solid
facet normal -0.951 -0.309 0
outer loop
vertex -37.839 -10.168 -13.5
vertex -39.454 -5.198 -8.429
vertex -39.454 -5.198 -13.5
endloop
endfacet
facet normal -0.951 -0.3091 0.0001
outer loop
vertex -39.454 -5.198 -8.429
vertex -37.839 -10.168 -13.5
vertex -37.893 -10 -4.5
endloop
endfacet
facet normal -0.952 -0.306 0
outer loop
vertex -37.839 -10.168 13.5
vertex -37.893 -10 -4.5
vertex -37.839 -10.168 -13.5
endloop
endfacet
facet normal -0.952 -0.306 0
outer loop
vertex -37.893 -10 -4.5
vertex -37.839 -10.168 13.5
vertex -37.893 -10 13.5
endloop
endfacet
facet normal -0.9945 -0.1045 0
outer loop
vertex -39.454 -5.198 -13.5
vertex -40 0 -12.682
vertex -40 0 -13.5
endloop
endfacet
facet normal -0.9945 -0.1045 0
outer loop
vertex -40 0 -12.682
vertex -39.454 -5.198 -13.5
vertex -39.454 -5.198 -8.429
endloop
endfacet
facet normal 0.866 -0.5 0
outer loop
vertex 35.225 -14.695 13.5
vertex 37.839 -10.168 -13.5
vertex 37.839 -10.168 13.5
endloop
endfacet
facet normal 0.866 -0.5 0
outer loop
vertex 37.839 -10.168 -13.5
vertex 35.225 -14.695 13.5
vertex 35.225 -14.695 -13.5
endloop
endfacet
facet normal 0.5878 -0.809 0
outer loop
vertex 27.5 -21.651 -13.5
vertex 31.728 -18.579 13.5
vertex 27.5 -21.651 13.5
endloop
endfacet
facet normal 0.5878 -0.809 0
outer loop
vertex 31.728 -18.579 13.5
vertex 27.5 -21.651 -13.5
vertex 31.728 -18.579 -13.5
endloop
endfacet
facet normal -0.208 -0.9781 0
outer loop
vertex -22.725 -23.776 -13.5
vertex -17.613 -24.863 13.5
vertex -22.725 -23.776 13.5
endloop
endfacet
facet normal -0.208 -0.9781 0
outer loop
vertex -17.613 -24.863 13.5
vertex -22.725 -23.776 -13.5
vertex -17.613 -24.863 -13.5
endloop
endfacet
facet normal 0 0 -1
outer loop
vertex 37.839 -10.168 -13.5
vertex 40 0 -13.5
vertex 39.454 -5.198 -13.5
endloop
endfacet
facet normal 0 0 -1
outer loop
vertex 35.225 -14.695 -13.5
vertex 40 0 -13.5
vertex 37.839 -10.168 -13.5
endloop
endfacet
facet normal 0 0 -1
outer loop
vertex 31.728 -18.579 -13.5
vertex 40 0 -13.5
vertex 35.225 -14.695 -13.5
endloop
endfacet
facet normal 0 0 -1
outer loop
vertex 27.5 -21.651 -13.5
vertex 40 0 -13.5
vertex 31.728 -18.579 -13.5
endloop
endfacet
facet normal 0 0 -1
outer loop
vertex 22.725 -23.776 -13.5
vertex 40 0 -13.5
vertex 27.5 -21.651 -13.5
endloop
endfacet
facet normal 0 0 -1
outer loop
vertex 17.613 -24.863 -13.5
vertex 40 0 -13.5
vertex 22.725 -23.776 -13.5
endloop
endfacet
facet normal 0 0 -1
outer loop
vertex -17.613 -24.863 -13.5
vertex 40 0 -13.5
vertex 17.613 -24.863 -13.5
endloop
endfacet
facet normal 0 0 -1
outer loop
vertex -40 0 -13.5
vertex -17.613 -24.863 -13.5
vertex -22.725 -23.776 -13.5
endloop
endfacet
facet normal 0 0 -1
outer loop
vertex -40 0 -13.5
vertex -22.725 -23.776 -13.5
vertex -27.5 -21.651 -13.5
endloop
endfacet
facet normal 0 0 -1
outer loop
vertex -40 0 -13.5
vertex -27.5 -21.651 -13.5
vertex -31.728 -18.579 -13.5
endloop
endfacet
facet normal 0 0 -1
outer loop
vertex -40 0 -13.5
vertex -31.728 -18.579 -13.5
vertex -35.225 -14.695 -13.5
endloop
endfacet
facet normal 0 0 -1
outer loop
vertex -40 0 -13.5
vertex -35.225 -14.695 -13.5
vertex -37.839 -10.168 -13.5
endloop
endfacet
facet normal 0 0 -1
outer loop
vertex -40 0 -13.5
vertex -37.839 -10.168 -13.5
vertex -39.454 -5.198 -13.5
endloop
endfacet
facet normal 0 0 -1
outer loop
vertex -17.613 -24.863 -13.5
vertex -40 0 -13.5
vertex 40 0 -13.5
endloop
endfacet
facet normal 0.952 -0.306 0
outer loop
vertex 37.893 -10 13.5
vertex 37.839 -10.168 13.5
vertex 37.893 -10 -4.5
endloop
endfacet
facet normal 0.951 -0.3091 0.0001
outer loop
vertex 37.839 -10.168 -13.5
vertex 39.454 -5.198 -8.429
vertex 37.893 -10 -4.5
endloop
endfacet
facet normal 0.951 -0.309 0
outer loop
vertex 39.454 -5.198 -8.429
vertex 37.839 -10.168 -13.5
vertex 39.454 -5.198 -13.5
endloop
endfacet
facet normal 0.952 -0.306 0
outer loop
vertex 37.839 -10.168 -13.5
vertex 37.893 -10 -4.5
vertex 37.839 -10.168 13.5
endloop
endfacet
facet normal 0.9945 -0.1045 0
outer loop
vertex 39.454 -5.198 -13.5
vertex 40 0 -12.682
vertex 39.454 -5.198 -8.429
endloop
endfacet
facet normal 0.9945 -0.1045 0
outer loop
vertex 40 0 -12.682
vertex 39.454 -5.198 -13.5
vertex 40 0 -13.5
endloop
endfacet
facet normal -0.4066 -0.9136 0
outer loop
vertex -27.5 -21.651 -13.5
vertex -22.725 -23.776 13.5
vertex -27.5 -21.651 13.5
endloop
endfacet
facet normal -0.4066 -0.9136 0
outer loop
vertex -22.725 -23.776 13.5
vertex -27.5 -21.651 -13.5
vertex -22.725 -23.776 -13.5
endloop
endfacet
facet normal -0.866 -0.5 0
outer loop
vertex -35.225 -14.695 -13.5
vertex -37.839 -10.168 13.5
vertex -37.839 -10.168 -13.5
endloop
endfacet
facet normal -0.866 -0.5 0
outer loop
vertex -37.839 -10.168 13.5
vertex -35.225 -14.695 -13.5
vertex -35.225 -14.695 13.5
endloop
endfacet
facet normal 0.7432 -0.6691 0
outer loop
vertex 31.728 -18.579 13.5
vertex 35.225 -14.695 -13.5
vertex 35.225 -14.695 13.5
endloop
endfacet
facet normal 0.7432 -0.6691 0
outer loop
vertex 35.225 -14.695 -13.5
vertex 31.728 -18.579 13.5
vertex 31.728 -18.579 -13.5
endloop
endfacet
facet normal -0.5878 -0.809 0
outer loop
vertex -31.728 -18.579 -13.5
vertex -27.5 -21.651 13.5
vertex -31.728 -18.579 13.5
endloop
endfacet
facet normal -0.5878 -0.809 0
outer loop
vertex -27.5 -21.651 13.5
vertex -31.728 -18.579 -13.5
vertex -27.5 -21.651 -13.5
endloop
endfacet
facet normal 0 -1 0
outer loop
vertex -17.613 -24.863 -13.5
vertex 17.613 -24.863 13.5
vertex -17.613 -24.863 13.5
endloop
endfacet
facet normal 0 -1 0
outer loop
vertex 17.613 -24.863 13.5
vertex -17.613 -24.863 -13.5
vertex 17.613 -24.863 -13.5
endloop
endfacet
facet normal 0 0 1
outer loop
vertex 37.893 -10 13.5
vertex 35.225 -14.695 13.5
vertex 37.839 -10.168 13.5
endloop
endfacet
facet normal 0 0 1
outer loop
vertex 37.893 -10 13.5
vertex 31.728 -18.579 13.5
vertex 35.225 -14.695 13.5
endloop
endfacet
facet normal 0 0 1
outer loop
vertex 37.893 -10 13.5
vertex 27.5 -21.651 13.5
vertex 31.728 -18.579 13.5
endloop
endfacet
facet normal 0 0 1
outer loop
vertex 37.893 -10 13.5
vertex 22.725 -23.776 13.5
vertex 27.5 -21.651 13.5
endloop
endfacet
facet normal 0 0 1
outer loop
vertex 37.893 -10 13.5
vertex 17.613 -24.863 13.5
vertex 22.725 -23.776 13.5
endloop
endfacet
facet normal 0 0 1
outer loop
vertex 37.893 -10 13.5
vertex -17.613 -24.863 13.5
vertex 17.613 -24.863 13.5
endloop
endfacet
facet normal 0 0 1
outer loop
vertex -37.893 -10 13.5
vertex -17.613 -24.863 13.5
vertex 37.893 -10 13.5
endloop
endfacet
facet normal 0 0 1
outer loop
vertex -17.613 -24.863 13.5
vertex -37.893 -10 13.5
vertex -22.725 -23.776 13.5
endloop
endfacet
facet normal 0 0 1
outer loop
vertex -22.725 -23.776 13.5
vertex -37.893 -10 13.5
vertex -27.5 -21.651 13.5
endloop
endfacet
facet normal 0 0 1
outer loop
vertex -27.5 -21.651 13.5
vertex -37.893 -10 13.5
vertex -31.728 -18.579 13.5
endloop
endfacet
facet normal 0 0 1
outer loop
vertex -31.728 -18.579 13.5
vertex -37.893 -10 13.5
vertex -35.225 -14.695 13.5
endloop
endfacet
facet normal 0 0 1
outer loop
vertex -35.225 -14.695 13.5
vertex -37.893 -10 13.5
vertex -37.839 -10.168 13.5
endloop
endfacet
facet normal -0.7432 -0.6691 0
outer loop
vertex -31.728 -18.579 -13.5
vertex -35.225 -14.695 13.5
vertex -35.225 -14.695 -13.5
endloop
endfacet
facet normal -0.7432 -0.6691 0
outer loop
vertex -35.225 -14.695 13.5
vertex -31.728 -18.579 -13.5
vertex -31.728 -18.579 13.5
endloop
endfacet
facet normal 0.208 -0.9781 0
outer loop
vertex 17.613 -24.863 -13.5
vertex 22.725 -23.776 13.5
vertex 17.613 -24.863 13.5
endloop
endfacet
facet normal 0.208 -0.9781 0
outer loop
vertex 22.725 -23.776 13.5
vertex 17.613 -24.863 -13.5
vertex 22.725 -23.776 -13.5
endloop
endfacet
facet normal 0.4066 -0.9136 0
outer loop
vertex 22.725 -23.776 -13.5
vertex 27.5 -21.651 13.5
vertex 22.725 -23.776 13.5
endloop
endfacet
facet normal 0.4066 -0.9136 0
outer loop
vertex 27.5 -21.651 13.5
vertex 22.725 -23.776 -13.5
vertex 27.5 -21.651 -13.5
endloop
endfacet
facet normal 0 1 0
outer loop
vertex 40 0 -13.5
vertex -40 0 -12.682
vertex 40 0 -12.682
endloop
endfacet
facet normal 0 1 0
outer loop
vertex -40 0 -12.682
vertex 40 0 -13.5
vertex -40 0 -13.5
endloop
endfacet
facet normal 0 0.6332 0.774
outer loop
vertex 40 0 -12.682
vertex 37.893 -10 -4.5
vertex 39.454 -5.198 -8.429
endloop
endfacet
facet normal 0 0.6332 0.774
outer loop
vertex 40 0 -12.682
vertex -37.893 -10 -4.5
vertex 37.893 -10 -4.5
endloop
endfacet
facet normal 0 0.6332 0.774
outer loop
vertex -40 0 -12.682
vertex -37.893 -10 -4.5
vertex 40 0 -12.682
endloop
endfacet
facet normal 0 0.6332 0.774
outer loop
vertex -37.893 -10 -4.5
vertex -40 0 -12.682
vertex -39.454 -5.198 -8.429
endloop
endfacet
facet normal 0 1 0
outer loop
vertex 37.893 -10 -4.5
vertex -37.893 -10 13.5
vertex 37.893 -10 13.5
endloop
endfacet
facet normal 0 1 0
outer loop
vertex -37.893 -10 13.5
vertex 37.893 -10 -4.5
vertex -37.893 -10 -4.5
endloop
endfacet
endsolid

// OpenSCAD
// file: ocular.scad
// ocular.scad — окуляр
ocular();
module top(){
    difference(){
        cylinder(d = 30, h = 5, center = true);
        cylinder(d = 23 - 0.5 - 3, h = 15, center = true);
    }
}

module ocular(){
    translate([0.4, 0, 35/2 + 5/2])
    top();
    difference(){
        cylinder(d = 23 - 0.5, h = 35, center = true);
        cylinder(d = 23 - 0.5 - 3, h = 40, center = true);
    }
}

// === Автономный запуск ===
// ocular();
// file: smartphone.scad
// smartphone.scad — смартфон
smartphone();
$fn = 128;
r_round_corner = 15;

module block(){
    phone_height = 147;
    phone_width = 71;
    
    hull(){
        translate([phone_height/2 - r_round_corner/2, phone_width/2 - r_round_corner/2, 0])
        cylinder(d = r_round_corner, h = 9, center = true);
        
        mirror([1,0,0])
        translate([phone_height/2 - r_round_corner/2, phone_width/2 - r_round_corner/2, 0])
        cylinder(d = r_round_corner, h = 9, center = true);
        
        mirror([0,1,0])
        translate([phone_height/2 - r_round_corner/2, phone_width/2 - r_round_corner/2, 0])
        cylinder(d = r_round_corner, h = 9, center = true);
        
        mirror([1,0,0]) mirror([0,1,0])
        translate([phone_height/2 - r_round_corner/2, phone_width/2 - r_round_corner/2, 0])
        cylinder(d = r_round_corner, h = 9, center = true);
    }
}

module cameras(){
    phone_height = 147;
    phone_width = 71;
    
    color("blue") translate([phone_height/2 - 13, phone_width/2 - 13, 0]) cylinder(d=18, h=15, center=true);
    color("blue") translate([phone_height/2 - 23, phone_width/2 - 30, 0]) cylinder(d=18, h=15, center=true);
    color("blue") translate([phone_height/2 - 32, phone_width/2 - 13, 0]) cylinder(d=18, h=15, center=true);
}

module smartphone(){
    block();
    cameras();
}

// === Автономный запуск ===
// smartphone();
// main file
use <smartphone.scad>
use <ocular.scad>

phone_height = 147;
phone_width = 71;




//translate([phone_height/2-23/2-19,phone_width/2-23/2-2,35/2+15])
//rotate([180,0,0])
//ocular();
//frame1();
//translate([0,25,3])
//color("red")
//corner(thickness=20);


module half_jaw(){
    difference(){
        block_jaw();
        translate([0, 25,0])
        cube([40+25*2, 25*2, 9*3+1], center=true);
    }
}
//polygon([[10,20],[15,25],[25,45]]);
points = [[0,0],[0, 9*3+1],[11, 9*3+1],[11, 9],[0,0]];

difference(){
    half_jaw();
    translate([0,1,-9*3/2])
    rotate([90,0,180])
    rotate([0,90,0])
    linear_extrude(height=40+25*2, center = true)
    polygon(points);
}

module block_jaw(){
    linear_extrude(height=9*3, center = true){
        hull(){
            translate([15,0,0])
            circle(25);
            translate([-15,0,0])
            circle(25);
        }
    }
}
//frame_crossbar();

module frame_crossbar(){
    crossbar_vertical(length=162+50);
    crossbar_horizontal(length=77+50);
}



module crossbar_horizontal(length){
    rotate([0,0,90])
    crossbar_vertical(length);
}
module crossbar_vertical(length){
    difference(){
        hull(){
            translate([-(length)/2,0,0])
            cylinder(d=7,h=3, center = true, $fn=32);
            
            translate([(length)/2,0,0])
            cylinder(d=7,h=3, center = true, $fn=32);
        }
        
        hull(){
            translate([-(length)/2+2,0,0])
            cylinder(d=3.5,h=10, center = true, $fn=32);
              
            translate([(length)/2-2,0,0])
            cylinder(d=3.5,h=10, center = true, $fn=32);
        }
    }
}

//difference(){
//    color("red")
//    corner(thickness=20);
//    
//    holes_corner();
//}



module nut_m3(){
    cylinder(d=6+0.5,h=4,center=true, $fn=6);
    cylinder(d=6+0.5,h=1,center=true, $fn=64);
}

module holes_corner(){
    translate([40,40,0.])
    rotate([90,0,0])
    cylinder(d=3.5,h=25, center = true, $fn=64);
    
    translate([80,40,0.])
    rotate([90,0,0])
    cylinder(d=3.5,h=25, center = true, $fn=64);
    
    translate([100,20,0.])
    rotate([0,90,0])
    cylinder(d=3.5,h=25, center = true, $fn=64);
    
    translate([100,-20,0.])
    rotate([0,90,0])
    cylinder(d=3.5,h=25, center = true, $fn=64);
    
    translate([95,-20,0])
    rotate([0,90,0])
    nut_m3();
    
    translate([95,20,0])
    rotate([0,90,0])
    nut_m3();
    
    translate([40,32.5,0])
    rotate([0,90,90])
    nut_m3();
    
    translate([80,32.5,0])
    rotate([0,90,90])
    nut_m3();
}
//difference(){
//    translate([phone_height/2-14, 22.5, 11.5])
//    cube([phone_height/2,phone_width, 3],center=true);
//    translate([phone_height/2-23/2-19,phone_width/2-23/2-2,35/2])
//    cylinder(d=23-0.5-3,h=40,center=true);
//}
module frame1(){
    difference(){
        color("green")
        translate([phone_height/2-phone_height/4+10,10,0])
        cube([phone_height/2,phone_width+10, 10], center=true);
        scale([1,1,2])
        block();
    }
}



module corner(thickness){
    translate([phone_height/2+20,0,0])
    frame2(thickness);
    
    translate([phone_height/2 - 13.5, phone_width/2,0])
    rotate([0,0,90])
    frame2(thickness);

}
module frame2(thickness){
    hull(){
        translate([5,phone_width/2,0])
        cylinder(d=5, h=thickness,center=true,$fn=32);
        
        mirror([1,0,0])
        translate([5,phone_width/2,0])
        cylinder(d=5, h=thickness,center=true,$fn=32);
        
        mirror([0,1,0])
        translate([5,phone_width/2,0])
        cylinder(d=5, h=thickness,center=true,$fn=32);
        
        mirror([1,0,0])
        mirror([0,1,0])
        translate([5,phone_width/2,0])
        cylinder(d=5, h=thickness,center=true,$fn=32);
    }
}
